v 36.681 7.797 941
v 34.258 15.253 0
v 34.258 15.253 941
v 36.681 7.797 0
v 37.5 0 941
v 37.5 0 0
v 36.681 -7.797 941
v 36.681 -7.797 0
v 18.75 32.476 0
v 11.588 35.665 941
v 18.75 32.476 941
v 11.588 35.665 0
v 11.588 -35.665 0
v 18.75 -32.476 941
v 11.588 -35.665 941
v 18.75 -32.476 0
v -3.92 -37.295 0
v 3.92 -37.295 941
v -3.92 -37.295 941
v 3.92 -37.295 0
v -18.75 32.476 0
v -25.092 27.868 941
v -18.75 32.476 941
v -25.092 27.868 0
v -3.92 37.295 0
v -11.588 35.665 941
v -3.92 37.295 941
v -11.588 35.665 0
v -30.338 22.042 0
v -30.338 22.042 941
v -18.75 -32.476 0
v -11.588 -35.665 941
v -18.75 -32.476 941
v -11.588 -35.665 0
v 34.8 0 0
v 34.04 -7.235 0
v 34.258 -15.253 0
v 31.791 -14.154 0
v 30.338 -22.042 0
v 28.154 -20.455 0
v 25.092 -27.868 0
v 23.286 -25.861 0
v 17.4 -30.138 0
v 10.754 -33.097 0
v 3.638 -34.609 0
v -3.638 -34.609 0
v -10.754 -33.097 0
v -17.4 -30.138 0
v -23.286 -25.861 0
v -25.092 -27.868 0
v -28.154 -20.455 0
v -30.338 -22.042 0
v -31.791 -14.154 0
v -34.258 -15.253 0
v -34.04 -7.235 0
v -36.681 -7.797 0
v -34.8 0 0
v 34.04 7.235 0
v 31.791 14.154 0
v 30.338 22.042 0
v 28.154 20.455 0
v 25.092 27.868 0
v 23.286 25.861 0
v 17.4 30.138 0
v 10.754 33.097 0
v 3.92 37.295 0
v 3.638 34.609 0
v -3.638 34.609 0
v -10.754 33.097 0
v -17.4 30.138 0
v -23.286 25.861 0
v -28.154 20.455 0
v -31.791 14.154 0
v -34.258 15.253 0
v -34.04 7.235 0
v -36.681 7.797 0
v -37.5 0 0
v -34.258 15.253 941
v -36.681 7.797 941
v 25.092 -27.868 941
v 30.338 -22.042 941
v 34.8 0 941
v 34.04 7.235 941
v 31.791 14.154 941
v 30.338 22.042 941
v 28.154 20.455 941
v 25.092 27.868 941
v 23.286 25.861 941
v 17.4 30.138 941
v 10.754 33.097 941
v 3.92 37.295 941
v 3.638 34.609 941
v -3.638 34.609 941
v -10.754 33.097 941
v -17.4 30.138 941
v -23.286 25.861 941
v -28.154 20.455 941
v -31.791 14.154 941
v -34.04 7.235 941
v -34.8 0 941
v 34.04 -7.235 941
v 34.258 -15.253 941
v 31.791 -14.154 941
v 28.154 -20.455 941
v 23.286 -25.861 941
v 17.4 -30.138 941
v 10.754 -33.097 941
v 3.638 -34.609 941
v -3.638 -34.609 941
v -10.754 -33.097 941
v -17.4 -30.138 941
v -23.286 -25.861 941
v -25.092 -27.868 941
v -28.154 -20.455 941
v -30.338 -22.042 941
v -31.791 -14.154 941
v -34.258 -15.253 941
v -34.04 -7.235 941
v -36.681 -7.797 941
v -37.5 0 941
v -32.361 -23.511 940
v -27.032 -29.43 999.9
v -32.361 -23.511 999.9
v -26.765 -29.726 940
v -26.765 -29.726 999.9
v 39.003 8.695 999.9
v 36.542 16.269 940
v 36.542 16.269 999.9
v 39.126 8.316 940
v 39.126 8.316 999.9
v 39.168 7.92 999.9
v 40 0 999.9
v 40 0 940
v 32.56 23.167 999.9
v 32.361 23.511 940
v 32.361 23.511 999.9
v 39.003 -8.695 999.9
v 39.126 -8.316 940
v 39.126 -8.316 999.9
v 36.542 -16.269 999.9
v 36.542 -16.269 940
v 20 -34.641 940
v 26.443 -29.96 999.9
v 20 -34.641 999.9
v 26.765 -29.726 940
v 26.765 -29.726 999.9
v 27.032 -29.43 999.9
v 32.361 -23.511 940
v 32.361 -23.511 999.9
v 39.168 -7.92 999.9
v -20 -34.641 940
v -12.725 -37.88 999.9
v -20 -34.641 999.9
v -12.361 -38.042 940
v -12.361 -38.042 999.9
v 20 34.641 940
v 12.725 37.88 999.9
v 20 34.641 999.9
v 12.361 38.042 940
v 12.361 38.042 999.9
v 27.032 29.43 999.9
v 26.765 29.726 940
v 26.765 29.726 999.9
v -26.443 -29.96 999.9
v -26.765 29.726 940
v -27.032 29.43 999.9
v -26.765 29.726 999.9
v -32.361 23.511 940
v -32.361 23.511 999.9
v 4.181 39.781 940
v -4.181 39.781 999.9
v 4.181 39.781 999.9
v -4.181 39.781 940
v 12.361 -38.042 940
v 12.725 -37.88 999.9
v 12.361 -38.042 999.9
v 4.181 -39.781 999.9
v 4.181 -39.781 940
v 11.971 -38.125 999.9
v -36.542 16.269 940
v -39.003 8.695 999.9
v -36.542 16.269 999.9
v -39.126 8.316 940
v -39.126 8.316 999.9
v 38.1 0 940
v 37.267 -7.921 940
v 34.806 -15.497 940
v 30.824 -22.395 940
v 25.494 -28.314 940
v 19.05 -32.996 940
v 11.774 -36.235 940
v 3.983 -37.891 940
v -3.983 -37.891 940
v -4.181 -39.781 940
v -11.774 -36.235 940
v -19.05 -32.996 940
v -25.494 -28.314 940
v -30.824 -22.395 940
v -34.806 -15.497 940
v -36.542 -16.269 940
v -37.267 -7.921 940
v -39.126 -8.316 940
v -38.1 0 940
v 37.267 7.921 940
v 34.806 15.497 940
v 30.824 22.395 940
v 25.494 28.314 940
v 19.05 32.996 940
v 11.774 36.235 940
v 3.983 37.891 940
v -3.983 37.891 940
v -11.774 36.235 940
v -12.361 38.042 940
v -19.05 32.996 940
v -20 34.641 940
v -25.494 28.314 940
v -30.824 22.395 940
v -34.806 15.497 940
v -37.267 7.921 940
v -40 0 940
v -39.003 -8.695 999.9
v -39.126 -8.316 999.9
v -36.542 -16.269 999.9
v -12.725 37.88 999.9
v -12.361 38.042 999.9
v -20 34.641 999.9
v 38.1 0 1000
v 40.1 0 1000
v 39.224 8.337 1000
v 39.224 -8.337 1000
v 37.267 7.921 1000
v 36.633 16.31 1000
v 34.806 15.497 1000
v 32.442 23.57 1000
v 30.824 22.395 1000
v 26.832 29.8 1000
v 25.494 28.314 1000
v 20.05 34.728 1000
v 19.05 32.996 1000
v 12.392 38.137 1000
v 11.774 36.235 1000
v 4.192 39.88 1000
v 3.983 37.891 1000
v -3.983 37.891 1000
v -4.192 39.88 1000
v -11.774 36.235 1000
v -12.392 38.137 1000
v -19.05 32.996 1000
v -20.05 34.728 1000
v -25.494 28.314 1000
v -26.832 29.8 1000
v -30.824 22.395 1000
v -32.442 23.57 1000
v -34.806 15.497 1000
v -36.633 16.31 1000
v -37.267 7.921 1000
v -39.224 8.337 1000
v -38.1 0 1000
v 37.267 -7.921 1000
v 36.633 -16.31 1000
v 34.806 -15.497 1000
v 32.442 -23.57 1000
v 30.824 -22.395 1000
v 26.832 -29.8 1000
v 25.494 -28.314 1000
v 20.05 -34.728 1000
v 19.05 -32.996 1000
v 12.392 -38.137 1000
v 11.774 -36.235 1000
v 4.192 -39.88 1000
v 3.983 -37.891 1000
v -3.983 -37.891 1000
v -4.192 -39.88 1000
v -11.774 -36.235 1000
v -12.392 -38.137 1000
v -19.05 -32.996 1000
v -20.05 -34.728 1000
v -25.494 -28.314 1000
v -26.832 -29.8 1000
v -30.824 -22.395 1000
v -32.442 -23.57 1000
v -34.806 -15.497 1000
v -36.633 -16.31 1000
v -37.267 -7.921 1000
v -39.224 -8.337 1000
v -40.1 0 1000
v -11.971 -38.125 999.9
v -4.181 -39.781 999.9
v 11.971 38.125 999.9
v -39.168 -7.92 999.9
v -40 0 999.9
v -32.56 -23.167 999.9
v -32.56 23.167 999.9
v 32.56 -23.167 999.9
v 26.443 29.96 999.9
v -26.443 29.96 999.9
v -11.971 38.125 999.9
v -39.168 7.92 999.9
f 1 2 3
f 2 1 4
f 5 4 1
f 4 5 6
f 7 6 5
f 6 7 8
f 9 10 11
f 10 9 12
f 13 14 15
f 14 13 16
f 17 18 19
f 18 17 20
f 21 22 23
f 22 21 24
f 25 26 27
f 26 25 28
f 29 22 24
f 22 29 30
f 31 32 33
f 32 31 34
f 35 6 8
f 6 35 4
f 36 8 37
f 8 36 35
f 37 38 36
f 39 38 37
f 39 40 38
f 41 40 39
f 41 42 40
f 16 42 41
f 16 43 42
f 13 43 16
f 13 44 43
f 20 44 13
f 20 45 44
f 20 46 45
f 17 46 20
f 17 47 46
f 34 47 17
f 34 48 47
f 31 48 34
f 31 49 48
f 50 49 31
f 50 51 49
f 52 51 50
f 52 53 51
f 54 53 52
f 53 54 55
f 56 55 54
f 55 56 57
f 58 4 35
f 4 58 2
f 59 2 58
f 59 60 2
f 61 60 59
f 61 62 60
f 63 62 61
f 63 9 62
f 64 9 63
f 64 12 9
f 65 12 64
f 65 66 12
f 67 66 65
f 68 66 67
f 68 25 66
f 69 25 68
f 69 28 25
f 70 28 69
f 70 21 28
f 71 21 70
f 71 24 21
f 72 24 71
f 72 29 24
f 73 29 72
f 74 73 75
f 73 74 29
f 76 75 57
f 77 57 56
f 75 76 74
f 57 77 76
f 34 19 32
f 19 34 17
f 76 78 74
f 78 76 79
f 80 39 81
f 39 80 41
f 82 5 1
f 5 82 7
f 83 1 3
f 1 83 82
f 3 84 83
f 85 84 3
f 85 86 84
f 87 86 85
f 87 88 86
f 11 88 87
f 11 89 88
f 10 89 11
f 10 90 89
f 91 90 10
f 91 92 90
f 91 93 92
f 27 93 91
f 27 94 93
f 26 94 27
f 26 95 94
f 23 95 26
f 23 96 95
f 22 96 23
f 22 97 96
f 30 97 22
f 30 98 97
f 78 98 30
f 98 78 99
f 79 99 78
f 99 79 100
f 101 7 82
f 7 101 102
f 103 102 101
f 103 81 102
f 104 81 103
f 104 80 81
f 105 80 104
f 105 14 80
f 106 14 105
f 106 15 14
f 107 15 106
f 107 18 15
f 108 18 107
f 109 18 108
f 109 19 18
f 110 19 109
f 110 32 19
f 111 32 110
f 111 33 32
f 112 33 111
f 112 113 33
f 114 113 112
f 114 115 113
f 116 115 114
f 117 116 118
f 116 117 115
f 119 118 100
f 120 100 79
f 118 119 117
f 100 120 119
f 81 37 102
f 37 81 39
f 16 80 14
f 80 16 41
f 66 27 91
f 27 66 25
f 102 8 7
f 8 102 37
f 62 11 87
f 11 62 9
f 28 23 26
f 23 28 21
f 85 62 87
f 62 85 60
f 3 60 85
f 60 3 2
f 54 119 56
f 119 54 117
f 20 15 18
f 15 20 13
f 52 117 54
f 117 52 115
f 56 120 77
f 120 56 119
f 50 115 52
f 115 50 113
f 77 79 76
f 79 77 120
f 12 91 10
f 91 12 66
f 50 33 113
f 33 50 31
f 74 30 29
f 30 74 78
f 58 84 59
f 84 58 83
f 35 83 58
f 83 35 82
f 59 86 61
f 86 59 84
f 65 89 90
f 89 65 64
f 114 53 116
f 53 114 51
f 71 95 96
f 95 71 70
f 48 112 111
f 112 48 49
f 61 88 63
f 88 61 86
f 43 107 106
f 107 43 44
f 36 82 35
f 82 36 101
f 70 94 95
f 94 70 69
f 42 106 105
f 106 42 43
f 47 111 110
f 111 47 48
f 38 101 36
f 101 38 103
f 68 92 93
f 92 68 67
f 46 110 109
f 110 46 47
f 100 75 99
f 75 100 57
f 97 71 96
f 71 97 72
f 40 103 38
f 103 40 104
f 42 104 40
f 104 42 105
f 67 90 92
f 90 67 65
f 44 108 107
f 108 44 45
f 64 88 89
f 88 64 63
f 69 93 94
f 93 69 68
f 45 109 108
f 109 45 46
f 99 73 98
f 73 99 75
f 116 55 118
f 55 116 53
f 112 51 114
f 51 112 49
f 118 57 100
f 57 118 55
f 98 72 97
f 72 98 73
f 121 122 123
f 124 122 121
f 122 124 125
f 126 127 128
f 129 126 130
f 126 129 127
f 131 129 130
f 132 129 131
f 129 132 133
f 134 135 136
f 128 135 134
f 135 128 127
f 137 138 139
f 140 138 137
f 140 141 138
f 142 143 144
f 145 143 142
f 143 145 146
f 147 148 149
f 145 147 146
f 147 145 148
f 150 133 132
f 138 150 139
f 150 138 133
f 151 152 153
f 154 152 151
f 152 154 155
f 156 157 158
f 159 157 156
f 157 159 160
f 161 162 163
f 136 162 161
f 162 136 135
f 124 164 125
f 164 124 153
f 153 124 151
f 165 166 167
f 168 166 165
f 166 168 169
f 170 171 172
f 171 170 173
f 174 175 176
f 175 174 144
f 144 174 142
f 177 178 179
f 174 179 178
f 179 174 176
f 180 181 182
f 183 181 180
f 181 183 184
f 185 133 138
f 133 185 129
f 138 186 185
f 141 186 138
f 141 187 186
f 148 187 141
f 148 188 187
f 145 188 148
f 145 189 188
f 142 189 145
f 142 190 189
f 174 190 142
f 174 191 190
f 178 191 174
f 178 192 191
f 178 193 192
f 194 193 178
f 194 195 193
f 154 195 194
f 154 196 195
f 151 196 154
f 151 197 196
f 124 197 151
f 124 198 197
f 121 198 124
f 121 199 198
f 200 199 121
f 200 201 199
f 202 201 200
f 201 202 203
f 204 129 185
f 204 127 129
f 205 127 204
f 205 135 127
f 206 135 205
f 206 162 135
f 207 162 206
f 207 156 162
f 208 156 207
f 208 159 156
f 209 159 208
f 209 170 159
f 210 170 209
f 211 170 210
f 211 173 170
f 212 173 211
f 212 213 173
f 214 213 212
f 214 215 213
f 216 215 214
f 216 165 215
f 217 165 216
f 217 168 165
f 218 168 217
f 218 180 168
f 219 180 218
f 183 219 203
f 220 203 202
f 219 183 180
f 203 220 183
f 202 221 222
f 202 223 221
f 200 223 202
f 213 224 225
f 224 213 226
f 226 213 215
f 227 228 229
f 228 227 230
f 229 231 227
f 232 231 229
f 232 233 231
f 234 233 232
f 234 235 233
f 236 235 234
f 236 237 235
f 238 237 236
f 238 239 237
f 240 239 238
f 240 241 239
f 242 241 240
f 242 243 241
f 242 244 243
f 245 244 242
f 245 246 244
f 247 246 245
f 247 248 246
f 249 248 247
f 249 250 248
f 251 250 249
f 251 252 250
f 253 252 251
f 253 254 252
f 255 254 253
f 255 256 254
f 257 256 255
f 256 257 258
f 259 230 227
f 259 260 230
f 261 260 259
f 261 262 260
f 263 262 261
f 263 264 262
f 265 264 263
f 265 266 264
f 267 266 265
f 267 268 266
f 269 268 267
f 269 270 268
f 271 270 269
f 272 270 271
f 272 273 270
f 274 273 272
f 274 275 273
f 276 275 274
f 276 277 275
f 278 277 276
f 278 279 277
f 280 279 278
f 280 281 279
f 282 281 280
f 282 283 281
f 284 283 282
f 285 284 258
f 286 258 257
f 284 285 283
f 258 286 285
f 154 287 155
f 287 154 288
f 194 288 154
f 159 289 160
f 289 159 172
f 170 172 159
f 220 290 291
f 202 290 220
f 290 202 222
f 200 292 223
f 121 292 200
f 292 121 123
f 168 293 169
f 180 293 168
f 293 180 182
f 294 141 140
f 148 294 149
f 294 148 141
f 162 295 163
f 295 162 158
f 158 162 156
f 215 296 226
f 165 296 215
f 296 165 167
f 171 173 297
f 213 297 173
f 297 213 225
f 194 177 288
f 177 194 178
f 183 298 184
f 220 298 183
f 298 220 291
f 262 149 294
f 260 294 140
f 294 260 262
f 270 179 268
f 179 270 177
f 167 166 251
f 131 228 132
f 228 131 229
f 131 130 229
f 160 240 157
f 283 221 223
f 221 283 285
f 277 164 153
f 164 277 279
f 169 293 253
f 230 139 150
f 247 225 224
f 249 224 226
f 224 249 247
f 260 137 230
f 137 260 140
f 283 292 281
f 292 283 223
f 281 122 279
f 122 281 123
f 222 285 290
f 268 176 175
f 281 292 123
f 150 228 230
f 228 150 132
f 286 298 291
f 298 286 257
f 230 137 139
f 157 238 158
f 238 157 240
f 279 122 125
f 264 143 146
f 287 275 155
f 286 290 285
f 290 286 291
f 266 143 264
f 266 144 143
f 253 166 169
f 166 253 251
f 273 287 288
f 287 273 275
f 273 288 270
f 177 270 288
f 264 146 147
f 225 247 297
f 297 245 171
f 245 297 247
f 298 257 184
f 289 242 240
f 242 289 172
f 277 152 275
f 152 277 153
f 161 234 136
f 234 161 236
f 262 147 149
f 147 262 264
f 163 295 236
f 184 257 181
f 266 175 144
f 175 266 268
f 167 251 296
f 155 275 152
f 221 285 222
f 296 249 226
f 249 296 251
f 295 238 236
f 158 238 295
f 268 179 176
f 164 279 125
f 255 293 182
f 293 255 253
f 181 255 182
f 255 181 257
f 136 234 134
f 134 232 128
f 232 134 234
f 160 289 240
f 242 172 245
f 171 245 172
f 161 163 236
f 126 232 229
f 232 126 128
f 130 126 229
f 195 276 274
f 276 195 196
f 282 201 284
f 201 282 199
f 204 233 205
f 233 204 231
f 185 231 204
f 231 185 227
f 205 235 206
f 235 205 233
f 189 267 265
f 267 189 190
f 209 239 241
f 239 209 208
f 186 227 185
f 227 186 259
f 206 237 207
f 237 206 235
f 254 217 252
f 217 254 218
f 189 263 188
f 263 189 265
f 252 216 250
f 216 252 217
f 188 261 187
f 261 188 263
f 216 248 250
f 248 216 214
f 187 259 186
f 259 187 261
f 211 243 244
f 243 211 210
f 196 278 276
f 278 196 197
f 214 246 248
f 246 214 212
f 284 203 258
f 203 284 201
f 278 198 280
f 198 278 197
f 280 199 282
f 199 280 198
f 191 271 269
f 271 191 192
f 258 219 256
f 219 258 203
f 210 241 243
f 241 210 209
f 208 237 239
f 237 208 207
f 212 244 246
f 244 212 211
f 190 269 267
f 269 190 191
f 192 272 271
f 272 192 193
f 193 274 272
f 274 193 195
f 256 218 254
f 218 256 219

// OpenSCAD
// Parameters
nominal_size = 75; //[40:160:1]
length_mm = 1000; //[500:2000:10]
include_end_fitting = 1; //[0:1:1]
pipe_od = 75; //[60:110:1]
wall_thickness = 2.7; //[1.5:5.5:0.1]
socket_length = 60; //[30:120:1]
socket_wall_extra = 2.5; //[1:6:0.1]
socket_clearance = 0.6; //[0.2:1.5:0.1]
stop_ring_thickness = 3; //[1:8:0.1]
stop_ring_depth = 1.5; //[0.5:4:0.1]
chamfer_length = 2; //[0.5:6:0.1]
overlap = 1; //[0.5:2:0.1]

// Module for the HT Pipe
module ht_pipe() {
  color([0.85, 0.85, 0.8]) {
    // Pipe body
    difference() {
      cylinder(h=length_mm - socket_length + overlap, r=pipe_od/2, center=false);
      translate([0, 0, -overlap])
        cylinder(h=length_mm - socket_length + overlap + 2*overlap, r=pipe_od/2 - wall_thickness, center=false);
    }
    
    // End fitting socket
    translate([0, 0, length_mm - socket_length]) {
      difference() {
        union() {
          cylinder(h=socket_length, r=pipe_od/2 + socket_wall_extra, center=false);
          translate([0, 0, socket_length - chamfer_length])
            cylinder(h=chamfer_length, r1=pipe_od/2 + socket_clearance, r2=pipe_od/2 + socket_clearance + chamfer_length, center=false);
        }
        translate([0, 0, -overlap])
          cylinder(h=socket_length + 2*overlap, r=pipe_od/2 + socket_clearance, center=false);
        translate([0, 0, socket_length - stop_ring_thickness - overlap])
          cylinder(h=stop_ring_thickness + 2*overlap, r=pipe_od/2 + socket_clearance - stop_ring_depth, center=false);
      }
    }
  }
}

// Assembly
module assembly() {
  ht_pipe();
}

assembly();
